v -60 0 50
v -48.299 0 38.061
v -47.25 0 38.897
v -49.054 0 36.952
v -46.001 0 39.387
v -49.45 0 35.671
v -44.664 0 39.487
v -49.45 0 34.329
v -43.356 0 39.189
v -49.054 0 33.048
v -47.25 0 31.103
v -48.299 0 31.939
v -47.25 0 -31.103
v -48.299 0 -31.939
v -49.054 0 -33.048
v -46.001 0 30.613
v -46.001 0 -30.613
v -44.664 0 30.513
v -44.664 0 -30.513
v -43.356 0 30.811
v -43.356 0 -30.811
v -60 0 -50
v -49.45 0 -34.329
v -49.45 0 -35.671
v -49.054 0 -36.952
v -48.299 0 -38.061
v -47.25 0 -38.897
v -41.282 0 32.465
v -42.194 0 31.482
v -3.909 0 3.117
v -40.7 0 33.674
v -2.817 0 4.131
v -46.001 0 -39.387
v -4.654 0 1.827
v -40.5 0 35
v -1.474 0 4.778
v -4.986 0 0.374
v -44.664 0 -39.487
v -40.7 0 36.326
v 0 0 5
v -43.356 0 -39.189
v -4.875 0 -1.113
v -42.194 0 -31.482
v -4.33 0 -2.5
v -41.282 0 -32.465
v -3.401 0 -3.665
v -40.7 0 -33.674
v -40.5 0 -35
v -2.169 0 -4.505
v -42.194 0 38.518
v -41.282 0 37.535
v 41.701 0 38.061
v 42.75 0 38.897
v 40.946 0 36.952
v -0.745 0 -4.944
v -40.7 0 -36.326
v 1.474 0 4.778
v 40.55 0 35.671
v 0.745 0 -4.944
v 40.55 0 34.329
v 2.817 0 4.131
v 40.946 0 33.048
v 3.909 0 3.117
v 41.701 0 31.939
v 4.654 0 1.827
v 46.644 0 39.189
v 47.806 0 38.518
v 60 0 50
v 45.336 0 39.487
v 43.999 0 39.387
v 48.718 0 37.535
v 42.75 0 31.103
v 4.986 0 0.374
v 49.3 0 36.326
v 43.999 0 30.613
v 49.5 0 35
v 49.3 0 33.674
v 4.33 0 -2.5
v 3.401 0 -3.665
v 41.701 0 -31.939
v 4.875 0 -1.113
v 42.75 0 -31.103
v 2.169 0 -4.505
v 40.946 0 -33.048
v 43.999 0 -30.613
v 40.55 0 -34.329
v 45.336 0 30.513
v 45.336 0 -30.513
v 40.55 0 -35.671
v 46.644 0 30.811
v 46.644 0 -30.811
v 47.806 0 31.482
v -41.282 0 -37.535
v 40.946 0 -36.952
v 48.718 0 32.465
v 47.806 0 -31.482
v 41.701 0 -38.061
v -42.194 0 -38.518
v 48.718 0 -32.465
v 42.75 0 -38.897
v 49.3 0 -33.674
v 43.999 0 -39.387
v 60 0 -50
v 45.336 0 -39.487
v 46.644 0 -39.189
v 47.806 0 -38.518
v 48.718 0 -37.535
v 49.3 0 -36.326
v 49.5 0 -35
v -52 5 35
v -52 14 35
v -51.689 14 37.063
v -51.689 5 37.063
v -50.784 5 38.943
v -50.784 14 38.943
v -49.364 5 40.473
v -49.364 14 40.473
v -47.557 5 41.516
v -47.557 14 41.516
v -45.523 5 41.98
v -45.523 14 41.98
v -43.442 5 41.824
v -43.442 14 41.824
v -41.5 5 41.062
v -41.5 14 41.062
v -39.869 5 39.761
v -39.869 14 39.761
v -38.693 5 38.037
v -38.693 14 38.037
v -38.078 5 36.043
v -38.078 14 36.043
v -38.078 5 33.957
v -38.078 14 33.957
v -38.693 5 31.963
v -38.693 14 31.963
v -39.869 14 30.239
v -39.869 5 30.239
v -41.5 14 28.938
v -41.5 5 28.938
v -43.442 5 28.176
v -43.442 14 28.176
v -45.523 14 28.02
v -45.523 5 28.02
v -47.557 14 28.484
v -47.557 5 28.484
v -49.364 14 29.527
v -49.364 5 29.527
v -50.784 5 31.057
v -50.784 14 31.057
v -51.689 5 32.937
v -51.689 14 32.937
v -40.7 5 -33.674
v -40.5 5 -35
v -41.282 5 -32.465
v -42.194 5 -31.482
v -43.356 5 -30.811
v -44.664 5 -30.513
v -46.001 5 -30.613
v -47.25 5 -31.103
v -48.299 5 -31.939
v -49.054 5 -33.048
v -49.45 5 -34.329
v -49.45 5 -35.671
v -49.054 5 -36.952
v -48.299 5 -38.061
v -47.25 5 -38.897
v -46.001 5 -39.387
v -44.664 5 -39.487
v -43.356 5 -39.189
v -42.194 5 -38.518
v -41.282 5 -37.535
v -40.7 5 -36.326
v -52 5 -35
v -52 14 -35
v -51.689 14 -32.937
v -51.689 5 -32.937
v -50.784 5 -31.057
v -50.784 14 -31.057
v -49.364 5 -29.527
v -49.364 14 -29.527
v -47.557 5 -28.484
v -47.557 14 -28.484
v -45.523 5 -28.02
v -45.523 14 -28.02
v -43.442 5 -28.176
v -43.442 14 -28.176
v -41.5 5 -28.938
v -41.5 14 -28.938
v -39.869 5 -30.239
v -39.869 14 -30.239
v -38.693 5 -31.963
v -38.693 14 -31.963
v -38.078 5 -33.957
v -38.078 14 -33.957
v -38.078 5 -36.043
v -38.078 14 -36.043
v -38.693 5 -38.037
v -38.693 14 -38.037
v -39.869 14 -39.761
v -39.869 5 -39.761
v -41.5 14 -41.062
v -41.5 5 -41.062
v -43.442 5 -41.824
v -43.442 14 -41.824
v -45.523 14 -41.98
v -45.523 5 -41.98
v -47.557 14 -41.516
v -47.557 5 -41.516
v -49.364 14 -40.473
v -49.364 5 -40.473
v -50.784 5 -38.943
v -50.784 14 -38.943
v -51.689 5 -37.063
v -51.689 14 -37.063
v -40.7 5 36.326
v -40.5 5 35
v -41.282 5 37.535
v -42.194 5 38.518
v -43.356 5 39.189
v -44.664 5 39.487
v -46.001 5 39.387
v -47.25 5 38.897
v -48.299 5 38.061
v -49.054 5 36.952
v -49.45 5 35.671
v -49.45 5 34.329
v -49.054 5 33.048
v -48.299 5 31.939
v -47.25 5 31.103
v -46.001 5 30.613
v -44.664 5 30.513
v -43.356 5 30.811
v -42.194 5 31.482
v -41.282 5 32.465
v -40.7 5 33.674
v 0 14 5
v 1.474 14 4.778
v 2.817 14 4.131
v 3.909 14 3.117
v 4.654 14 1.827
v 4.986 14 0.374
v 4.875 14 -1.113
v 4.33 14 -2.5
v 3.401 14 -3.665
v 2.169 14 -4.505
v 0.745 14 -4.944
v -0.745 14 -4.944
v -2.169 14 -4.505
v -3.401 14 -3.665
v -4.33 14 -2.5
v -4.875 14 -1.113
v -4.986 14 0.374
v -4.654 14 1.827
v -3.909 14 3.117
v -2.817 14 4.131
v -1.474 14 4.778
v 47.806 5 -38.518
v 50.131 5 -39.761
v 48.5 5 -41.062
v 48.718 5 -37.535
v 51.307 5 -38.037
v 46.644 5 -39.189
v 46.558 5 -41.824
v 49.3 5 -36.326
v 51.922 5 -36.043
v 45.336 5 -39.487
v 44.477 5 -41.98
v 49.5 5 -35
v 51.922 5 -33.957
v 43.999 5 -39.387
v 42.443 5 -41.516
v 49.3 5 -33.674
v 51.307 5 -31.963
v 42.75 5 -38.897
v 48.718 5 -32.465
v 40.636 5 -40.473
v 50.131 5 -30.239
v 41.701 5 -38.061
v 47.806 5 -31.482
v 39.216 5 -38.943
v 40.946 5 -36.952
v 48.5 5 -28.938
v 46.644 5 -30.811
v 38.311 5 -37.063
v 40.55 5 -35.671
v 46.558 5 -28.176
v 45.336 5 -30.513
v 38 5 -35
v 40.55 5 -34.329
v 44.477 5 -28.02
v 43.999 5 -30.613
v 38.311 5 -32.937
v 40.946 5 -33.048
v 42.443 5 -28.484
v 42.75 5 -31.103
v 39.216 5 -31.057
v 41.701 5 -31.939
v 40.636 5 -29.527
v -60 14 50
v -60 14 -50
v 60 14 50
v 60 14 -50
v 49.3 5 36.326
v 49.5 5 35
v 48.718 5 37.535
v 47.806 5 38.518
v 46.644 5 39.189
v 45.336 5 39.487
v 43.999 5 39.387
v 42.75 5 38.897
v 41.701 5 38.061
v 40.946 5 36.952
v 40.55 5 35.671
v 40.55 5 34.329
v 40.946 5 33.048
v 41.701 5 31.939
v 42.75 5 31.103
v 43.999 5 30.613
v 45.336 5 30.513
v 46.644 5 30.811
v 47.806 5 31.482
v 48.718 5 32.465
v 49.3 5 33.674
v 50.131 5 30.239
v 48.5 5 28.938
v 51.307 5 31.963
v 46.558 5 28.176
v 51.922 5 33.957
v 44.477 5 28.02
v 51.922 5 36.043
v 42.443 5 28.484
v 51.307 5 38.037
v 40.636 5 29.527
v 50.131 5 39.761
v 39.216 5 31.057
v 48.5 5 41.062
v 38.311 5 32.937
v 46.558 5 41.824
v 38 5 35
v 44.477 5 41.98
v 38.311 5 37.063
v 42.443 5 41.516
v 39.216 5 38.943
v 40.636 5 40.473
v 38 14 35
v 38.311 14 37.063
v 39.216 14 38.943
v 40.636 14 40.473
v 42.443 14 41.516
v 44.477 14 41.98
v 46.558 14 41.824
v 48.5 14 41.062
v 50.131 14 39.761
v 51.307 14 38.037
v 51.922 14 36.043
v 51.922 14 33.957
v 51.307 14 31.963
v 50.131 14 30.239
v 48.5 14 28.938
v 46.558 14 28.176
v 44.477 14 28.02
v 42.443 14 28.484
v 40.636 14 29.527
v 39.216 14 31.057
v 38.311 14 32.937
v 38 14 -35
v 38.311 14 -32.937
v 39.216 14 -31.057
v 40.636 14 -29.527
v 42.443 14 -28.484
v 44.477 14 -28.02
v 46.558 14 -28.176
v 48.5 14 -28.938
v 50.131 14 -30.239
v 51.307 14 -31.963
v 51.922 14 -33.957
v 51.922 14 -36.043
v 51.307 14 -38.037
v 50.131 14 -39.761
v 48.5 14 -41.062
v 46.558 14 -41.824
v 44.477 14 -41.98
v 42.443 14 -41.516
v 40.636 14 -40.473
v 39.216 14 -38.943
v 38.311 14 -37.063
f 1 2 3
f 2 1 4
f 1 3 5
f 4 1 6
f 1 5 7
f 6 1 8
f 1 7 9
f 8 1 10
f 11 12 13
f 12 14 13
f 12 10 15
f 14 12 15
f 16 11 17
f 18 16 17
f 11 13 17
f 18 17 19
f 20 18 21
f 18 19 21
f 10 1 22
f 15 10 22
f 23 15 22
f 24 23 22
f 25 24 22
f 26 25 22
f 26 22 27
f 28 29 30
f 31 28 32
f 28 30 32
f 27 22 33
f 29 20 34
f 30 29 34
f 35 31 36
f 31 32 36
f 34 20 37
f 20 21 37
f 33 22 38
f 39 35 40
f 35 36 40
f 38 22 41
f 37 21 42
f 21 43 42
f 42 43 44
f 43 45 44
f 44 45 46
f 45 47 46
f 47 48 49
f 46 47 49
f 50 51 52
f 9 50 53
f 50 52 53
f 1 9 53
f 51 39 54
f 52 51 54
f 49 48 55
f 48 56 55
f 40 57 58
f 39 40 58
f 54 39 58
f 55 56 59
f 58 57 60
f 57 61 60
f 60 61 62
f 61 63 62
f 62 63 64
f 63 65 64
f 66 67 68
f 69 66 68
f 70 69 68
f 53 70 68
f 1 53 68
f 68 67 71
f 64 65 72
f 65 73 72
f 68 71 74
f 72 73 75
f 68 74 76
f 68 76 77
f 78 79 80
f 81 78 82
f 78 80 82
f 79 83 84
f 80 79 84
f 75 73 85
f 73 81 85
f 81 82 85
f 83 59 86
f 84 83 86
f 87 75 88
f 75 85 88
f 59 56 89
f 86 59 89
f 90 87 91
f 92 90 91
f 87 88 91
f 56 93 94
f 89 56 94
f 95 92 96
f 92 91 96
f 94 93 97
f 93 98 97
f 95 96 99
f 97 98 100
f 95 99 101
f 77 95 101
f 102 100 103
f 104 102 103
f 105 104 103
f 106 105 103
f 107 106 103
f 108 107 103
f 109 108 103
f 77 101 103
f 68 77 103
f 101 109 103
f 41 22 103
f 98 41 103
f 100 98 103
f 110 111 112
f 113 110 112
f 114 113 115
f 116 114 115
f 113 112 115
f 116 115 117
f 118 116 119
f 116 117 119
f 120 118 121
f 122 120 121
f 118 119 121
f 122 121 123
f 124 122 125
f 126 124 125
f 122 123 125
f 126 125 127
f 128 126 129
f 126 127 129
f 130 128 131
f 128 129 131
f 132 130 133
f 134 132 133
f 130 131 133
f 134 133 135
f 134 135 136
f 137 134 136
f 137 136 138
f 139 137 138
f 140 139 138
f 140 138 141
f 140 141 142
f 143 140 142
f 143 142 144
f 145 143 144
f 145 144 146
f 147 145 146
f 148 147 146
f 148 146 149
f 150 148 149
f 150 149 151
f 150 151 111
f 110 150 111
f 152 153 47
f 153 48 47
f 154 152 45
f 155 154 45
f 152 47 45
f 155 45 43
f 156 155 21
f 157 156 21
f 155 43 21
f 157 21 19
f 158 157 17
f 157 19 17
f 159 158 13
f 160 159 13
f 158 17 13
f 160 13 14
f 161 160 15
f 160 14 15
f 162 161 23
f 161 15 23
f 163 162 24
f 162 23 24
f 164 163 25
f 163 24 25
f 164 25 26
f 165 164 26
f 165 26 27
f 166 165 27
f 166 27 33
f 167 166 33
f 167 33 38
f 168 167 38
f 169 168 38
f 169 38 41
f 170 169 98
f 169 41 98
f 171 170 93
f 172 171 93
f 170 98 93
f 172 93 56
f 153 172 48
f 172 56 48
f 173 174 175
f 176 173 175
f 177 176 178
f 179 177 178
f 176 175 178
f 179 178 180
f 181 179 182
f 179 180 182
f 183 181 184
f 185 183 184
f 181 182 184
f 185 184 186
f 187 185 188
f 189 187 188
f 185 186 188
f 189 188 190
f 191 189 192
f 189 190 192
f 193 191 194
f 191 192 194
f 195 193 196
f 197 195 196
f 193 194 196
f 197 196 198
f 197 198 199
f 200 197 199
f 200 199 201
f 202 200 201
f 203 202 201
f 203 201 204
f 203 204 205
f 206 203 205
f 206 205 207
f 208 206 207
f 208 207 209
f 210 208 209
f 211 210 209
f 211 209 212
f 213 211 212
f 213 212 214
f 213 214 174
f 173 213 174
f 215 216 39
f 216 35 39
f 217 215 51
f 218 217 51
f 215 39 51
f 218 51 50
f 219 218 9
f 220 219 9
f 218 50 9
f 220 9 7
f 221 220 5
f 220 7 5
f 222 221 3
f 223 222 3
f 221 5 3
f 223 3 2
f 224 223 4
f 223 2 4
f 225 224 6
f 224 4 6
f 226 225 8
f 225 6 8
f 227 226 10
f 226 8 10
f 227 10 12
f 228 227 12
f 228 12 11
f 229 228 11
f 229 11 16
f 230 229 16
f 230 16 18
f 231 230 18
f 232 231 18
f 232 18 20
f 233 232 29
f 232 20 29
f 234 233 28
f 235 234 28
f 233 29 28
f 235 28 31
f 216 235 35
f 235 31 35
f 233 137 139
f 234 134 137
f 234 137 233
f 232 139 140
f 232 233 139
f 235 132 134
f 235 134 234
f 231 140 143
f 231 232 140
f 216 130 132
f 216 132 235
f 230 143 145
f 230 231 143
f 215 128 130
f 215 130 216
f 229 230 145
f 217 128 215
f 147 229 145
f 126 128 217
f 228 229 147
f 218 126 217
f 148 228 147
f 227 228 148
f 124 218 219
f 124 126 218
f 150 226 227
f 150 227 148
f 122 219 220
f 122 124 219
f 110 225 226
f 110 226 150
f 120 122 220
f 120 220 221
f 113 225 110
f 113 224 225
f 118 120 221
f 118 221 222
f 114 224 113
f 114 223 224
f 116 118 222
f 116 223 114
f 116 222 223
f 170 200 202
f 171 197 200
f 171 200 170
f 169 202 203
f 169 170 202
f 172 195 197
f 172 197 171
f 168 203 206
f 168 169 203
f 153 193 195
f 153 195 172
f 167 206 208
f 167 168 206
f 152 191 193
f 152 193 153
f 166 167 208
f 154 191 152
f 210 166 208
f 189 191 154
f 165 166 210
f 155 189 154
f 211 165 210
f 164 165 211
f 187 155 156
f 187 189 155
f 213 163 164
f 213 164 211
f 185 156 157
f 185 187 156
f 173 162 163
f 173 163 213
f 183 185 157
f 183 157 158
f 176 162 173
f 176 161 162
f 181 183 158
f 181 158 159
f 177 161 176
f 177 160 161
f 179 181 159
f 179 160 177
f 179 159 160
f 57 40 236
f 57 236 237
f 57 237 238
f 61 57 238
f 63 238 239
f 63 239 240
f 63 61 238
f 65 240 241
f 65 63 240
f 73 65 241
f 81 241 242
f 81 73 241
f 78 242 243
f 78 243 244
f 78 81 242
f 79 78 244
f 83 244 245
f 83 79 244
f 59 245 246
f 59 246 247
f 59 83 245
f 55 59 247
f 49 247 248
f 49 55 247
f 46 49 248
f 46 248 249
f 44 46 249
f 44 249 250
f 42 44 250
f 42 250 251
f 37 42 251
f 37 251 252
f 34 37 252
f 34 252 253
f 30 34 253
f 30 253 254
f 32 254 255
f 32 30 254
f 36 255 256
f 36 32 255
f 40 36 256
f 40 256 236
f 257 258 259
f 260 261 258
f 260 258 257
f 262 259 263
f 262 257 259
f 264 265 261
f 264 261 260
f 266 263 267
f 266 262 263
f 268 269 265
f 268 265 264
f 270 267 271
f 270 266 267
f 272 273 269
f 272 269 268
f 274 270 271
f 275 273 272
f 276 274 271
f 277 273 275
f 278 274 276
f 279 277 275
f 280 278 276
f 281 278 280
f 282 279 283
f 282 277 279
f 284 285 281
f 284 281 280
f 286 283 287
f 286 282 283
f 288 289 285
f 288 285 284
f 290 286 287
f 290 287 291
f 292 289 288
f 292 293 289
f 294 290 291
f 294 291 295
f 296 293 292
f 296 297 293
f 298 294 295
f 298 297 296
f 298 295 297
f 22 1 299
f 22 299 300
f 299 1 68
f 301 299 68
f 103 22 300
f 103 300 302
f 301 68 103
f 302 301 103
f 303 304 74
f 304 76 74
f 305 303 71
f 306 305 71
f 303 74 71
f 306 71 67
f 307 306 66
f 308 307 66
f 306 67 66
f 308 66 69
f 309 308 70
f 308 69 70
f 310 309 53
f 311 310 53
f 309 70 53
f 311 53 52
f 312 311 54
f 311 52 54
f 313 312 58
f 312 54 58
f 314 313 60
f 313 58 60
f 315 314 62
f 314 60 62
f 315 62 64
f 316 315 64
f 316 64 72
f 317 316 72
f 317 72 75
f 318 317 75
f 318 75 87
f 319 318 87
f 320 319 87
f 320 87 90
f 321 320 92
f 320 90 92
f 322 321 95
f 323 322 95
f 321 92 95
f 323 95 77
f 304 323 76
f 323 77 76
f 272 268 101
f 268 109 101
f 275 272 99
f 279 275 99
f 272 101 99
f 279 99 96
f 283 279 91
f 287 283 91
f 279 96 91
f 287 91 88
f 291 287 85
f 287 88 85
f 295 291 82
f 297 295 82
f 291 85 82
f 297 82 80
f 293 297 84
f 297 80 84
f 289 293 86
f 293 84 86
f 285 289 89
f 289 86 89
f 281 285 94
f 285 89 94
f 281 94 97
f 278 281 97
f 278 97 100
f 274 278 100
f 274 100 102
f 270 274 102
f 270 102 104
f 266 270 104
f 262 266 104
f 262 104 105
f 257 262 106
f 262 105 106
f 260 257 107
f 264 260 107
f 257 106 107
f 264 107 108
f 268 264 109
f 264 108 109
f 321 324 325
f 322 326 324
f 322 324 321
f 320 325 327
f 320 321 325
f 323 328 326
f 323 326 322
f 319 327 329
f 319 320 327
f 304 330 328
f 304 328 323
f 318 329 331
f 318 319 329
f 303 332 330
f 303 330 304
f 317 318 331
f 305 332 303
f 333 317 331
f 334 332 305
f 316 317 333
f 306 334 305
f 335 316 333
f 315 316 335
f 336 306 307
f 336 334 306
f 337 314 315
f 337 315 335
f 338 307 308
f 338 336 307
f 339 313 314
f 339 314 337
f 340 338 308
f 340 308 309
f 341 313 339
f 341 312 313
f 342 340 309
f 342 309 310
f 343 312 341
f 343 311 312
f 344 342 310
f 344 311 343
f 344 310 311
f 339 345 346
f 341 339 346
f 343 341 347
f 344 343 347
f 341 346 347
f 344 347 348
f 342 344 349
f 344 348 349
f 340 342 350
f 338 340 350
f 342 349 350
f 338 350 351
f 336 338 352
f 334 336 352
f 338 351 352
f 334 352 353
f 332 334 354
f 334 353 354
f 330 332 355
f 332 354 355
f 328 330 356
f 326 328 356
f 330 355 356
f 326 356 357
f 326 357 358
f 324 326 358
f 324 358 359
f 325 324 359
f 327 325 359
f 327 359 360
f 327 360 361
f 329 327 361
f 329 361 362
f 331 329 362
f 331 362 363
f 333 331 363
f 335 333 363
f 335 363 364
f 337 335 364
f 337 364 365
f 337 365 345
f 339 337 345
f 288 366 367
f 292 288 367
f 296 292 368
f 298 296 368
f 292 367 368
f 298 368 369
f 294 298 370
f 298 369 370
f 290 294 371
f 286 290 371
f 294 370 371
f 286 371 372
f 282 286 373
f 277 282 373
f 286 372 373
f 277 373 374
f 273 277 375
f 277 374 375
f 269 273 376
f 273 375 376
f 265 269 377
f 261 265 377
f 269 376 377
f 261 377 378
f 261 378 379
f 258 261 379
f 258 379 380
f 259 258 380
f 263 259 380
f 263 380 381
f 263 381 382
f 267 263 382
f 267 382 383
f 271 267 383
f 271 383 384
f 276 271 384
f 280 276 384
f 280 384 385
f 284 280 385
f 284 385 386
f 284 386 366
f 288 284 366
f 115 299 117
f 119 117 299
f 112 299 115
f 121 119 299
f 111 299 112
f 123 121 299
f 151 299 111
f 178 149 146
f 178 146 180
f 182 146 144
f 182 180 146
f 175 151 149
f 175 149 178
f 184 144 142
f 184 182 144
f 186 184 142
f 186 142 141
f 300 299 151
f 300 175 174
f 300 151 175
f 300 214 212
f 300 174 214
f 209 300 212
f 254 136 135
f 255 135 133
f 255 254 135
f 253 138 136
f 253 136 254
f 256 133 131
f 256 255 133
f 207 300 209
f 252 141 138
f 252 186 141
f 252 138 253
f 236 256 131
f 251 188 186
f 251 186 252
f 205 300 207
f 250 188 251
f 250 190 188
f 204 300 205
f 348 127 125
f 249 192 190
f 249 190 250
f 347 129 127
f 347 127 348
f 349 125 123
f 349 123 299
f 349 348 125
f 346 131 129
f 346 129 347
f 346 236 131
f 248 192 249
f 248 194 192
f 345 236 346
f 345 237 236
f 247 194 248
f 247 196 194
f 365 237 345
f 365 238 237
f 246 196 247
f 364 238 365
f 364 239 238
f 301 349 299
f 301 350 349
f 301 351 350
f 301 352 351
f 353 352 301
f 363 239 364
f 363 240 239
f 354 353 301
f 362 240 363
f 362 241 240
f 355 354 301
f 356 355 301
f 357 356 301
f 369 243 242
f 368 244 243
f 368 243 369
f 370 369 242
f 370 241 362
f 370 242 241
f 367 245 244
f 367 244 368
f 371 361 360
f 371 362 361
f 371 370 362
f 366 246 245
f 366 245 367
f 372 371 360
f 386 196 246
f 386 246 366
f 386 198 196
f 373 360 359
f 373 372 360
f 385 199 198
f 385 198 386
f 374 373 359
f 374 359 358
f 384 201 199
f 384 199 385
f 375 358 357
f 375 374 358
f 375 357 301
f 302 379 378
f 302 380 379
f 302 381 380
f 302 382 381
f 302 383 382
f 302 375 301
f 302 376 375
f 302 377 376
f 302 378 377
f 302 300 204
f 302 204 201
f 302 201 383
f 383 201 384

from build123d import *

# Parameters (mm, degrees)
ESBO_O1_W                         = 120
ESBO_O1_H                         = 100
ESBO_O1_R                         = 5
RESSALTO_EXTRUS_O1_DEPTH          = 14
REBAIXO_PARA_SHCS_M81_D           = 9
REBAIXO_PARA_SHCS_M81_CBORE_D     = 14
REBAIXO_PARA_SHCS_M81_CBORE_DEPTH = 9


with BuildPart() as part:
    # Esboço1 → Ressalto-extrusão1 (new body)
    with BuildSketch(Plane(origin=(0, 0, 0), x_dir=(1, 0, 0), z_dir=(0, 1, 0))):
        Rectangle(ESBO_O1_W, ESBO_O1_H)
        with Locations(Location((0, 0, 0), (0, 0, 270))):  # turned: the seam where the file's is
            Circle(ESBO_O1_R, mode=Mode.SUBTRACT)
    extrude(amount=RESSALTO_EXTRUS_O1_DEPTH)

    # Rebaixo para SHCS M81 (through all)
    with Locations(Plane(origin=(0, 14, 0), x_dir=(-1, 0, 0), z_dir=(0, 1, 0))):
        with Locations((45, -35), (45, 35), (-45, 35), (-45, -35)):
            CounterBoreHole(REBAIXO_PARA_SHCS_M81_D / 2, REBAIXO_PARA_SHCS_M81_CBORE_D / 2, REBAIXO_PARA_SHCS_M81_CBORE_DEPTH)


solid = part.part
